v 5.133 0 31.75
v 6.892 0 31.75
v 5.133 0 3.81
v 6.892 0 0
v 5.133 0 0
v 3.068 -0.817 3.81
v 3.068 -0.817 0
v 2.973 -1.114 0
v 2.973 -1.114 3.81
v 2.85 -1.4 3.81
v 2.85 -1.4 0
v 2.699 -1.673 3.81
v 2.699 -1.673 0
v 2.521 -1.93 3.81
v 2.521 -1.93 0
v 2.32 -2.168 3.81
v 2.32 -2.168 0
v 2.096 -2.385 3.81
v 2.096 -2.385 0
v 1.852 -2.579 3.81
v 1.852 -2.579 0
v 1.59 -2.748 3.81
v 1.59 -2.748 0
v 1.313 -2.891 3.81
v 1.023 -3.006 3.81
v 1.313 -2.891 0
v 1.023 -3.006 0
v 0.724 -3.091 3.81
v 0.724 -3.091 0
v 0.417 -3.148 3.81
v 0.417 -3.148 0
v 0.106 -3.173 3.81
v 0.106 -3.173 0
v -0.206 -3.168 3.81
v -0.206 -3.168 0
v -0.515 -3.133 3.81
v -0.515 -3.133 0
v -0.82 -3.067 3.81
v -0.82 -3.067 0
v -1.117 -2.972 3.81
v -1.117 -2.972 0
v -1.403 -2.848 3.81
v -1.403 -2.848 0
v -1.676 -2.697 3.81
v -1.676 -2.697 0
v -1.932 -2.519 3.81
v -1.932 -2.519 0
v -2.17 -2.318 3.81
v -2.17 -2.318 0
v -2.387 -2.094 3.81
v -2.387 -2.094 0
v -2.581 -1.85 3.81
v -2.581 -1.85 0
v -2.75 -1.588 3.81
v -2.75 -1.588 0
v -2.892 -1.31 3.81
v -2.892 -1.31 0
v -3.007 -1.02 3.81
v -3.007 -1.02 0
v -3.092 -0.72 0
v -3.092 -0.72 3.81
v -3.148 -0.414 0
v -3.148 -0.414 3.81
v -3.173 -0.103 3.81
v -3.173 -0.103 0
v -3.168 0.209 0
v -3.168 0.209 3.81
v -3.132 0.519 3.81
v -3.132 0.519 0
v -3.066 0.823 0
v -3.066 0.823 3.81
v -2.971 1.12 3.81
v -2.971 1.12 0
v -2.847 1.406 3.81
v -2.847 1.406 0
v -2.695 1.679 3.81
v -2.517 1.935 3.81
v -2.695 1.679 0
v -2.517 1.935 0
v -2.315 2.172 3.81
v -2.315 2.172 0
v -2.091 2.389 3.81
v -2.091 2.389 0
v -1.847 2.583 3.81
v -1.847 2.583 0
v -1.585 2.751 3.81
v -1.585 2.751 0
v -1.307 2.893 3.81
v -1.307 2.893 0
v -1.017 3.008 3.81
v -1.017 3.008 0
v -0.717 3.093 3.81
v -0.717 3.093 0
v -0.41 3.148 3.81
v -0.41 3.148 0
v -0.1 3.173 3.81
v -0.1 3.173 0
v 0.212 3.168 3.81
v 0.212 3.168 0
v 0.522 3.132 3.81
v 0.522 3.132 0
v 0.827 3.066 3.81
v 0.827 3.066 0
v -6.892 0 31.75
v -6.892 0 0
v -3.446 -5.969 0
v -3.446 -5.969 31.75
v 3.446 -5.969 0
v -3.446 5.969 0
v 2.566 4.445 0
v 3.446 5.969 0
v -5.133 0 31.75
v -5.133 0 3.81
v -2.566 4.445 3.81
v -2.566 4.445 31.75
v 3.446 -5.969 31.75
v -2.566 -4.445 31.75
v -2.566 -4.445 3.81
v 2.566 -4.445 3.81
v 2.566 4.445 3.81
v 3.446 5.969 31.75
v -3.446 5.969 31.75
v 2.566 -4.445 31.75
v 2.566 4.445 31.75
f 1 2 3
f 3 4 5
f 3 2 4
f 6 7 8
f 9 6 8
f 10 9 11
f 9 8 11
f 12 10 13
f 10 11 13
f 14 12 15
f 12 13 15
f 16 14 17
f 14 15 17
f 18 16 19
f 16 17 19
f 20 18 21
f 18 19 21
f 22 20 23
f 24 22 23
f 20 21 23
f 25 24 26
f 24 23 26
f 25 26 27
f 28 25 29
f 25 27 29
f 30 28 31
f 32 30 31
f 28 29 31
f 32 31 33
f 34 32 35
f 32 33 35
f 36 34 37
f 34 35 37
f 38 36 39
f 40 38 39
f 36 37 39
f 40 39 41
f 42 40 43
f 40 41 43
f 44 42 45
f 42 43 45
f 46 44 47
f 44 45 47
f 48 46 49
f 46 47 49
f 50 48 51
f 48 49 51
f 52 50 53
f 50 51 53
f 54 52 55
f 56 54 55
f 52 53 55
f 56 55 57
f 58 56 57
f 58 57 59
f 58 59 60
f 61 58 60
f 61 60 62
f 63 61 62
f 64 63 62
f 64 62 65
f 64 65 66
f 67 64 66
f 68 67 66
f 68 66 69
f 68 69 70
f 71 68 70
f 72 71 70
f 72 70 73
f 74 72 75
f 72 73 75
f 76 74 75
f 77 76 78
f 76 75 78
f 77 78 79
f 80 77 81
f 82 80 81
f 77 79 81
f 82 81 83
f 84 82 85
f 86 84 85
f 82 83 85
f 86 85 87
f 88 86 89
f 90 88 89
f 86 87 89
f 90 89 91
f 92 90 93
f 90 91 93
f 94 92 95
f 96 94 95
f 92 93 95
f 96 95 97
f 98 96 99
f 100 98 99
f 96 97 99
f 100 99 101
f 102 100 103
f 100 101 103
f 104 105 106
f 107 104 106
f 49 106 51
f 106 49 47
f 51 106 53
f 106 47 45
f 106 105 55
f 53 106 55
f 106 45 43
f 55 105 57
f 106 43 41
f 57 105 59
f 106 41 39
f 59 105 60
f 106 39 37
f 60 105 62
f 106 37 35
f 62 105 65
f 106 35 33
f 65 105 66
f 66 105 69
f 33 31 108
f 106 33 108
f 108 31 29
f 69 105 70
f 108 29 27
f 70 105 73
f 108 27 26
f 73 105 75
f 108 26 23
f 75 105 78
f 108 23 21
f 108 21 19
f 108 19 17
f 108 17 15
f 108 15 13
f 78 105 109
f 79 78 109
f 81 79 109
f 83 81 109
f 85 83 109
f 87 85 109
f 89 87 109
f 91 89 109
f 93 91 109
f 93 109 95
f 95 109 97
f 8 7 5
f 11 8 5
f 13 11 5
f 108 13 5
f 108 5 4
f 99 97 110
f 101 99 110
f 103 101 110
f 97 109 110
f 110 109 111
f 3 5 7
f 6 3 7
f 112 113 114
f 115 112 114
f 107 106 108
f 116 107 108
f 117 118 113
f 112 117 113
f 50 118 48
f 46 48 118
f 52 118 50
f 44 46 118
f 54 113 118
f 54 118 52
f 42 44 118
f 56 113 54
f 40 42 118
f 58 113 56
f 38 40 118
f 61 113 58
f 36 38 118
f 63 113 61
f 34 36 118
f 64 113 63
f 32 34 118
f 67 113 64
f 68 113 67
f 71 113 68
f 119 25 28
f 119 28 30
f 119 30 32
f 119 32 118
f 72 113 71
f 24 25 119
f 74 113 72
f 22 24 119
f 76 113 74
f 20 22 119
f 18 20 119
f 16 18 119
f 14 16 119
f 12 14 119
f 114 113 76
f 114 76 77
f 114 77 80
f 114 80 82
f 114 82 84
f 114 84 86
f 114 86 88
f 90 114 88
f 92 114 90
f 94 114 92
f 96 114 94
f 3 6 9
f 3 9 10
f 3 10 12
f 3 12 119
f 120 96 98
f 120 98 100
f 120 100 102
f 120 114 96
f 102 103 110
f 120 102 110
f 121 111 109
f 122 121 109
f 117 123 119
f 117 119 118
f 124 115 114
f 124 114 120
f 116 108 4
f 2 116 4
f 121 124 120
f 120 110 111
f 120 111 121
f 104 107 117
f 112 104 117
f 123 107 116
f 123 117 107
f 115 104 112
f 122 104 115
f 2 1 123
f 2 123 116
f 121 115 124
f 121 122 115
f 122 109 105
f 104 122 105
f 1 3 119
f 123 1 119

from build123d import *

# Parameters (mm, degrees)
BOSS_EXTRUDE1_DEPTH = 31.75
BOSS_EXTRUDE2_DEPTH = 3.81


with BuildPart() as part:
    # Sketch2 → Boss-Extrude1 (new body)
    with BuildSketch(Plane.XY):
        Polygon((2.566321947, 4.445), (3.446203757, 5.969), (-3.446203757, 5.969), (-6.892407514, 0), (-3.446203757, -5.969), (3.446203757, -5.969), (6.892407514, 0), (5.132643893, 0), (2.566321947, -4.445), (-2.566321947, -4.445), (-5.132643893, 0), (-2.566321947, 4.445), align=None)
    extrude(amount=BOSS_EXTRUDE1_DEPTH)

    # Sketch3 → Boss-Extrude2 (add)
    with BuildSketch(Plane(origin=(0, 0, 0), x_dir=(-1, 0, 0), z_dir=(0, 0, -1))):
        with BuildLine():
            Line((-5.132643893, 0), (-3.068091577, -0.816969447))
            ThreePointArc((-3.068091577, -0.816969447), (2.749630657, -1.5875), (-0.826529493, 3.06552997))
            Line((-0.826529493, 3.06552997), (-2.566321947, 4.445))
            Line((-2.566321947, 4.445), (2.566321947, 4.445))
            Line((2.566321947, 4.445), (5.132643893, 0))
            Line((5.132643893, 0), (2.566321947, -4.445))
            Line((2.566321947, -4.445), (-2.566321947, -4.445))
            Line((-2.566321947, -4.445), (-5.132643893, 0))
        make_face()
    extrude(amount=-BOSS_EXTRUDE2_DEPTH)


solid = part.part
